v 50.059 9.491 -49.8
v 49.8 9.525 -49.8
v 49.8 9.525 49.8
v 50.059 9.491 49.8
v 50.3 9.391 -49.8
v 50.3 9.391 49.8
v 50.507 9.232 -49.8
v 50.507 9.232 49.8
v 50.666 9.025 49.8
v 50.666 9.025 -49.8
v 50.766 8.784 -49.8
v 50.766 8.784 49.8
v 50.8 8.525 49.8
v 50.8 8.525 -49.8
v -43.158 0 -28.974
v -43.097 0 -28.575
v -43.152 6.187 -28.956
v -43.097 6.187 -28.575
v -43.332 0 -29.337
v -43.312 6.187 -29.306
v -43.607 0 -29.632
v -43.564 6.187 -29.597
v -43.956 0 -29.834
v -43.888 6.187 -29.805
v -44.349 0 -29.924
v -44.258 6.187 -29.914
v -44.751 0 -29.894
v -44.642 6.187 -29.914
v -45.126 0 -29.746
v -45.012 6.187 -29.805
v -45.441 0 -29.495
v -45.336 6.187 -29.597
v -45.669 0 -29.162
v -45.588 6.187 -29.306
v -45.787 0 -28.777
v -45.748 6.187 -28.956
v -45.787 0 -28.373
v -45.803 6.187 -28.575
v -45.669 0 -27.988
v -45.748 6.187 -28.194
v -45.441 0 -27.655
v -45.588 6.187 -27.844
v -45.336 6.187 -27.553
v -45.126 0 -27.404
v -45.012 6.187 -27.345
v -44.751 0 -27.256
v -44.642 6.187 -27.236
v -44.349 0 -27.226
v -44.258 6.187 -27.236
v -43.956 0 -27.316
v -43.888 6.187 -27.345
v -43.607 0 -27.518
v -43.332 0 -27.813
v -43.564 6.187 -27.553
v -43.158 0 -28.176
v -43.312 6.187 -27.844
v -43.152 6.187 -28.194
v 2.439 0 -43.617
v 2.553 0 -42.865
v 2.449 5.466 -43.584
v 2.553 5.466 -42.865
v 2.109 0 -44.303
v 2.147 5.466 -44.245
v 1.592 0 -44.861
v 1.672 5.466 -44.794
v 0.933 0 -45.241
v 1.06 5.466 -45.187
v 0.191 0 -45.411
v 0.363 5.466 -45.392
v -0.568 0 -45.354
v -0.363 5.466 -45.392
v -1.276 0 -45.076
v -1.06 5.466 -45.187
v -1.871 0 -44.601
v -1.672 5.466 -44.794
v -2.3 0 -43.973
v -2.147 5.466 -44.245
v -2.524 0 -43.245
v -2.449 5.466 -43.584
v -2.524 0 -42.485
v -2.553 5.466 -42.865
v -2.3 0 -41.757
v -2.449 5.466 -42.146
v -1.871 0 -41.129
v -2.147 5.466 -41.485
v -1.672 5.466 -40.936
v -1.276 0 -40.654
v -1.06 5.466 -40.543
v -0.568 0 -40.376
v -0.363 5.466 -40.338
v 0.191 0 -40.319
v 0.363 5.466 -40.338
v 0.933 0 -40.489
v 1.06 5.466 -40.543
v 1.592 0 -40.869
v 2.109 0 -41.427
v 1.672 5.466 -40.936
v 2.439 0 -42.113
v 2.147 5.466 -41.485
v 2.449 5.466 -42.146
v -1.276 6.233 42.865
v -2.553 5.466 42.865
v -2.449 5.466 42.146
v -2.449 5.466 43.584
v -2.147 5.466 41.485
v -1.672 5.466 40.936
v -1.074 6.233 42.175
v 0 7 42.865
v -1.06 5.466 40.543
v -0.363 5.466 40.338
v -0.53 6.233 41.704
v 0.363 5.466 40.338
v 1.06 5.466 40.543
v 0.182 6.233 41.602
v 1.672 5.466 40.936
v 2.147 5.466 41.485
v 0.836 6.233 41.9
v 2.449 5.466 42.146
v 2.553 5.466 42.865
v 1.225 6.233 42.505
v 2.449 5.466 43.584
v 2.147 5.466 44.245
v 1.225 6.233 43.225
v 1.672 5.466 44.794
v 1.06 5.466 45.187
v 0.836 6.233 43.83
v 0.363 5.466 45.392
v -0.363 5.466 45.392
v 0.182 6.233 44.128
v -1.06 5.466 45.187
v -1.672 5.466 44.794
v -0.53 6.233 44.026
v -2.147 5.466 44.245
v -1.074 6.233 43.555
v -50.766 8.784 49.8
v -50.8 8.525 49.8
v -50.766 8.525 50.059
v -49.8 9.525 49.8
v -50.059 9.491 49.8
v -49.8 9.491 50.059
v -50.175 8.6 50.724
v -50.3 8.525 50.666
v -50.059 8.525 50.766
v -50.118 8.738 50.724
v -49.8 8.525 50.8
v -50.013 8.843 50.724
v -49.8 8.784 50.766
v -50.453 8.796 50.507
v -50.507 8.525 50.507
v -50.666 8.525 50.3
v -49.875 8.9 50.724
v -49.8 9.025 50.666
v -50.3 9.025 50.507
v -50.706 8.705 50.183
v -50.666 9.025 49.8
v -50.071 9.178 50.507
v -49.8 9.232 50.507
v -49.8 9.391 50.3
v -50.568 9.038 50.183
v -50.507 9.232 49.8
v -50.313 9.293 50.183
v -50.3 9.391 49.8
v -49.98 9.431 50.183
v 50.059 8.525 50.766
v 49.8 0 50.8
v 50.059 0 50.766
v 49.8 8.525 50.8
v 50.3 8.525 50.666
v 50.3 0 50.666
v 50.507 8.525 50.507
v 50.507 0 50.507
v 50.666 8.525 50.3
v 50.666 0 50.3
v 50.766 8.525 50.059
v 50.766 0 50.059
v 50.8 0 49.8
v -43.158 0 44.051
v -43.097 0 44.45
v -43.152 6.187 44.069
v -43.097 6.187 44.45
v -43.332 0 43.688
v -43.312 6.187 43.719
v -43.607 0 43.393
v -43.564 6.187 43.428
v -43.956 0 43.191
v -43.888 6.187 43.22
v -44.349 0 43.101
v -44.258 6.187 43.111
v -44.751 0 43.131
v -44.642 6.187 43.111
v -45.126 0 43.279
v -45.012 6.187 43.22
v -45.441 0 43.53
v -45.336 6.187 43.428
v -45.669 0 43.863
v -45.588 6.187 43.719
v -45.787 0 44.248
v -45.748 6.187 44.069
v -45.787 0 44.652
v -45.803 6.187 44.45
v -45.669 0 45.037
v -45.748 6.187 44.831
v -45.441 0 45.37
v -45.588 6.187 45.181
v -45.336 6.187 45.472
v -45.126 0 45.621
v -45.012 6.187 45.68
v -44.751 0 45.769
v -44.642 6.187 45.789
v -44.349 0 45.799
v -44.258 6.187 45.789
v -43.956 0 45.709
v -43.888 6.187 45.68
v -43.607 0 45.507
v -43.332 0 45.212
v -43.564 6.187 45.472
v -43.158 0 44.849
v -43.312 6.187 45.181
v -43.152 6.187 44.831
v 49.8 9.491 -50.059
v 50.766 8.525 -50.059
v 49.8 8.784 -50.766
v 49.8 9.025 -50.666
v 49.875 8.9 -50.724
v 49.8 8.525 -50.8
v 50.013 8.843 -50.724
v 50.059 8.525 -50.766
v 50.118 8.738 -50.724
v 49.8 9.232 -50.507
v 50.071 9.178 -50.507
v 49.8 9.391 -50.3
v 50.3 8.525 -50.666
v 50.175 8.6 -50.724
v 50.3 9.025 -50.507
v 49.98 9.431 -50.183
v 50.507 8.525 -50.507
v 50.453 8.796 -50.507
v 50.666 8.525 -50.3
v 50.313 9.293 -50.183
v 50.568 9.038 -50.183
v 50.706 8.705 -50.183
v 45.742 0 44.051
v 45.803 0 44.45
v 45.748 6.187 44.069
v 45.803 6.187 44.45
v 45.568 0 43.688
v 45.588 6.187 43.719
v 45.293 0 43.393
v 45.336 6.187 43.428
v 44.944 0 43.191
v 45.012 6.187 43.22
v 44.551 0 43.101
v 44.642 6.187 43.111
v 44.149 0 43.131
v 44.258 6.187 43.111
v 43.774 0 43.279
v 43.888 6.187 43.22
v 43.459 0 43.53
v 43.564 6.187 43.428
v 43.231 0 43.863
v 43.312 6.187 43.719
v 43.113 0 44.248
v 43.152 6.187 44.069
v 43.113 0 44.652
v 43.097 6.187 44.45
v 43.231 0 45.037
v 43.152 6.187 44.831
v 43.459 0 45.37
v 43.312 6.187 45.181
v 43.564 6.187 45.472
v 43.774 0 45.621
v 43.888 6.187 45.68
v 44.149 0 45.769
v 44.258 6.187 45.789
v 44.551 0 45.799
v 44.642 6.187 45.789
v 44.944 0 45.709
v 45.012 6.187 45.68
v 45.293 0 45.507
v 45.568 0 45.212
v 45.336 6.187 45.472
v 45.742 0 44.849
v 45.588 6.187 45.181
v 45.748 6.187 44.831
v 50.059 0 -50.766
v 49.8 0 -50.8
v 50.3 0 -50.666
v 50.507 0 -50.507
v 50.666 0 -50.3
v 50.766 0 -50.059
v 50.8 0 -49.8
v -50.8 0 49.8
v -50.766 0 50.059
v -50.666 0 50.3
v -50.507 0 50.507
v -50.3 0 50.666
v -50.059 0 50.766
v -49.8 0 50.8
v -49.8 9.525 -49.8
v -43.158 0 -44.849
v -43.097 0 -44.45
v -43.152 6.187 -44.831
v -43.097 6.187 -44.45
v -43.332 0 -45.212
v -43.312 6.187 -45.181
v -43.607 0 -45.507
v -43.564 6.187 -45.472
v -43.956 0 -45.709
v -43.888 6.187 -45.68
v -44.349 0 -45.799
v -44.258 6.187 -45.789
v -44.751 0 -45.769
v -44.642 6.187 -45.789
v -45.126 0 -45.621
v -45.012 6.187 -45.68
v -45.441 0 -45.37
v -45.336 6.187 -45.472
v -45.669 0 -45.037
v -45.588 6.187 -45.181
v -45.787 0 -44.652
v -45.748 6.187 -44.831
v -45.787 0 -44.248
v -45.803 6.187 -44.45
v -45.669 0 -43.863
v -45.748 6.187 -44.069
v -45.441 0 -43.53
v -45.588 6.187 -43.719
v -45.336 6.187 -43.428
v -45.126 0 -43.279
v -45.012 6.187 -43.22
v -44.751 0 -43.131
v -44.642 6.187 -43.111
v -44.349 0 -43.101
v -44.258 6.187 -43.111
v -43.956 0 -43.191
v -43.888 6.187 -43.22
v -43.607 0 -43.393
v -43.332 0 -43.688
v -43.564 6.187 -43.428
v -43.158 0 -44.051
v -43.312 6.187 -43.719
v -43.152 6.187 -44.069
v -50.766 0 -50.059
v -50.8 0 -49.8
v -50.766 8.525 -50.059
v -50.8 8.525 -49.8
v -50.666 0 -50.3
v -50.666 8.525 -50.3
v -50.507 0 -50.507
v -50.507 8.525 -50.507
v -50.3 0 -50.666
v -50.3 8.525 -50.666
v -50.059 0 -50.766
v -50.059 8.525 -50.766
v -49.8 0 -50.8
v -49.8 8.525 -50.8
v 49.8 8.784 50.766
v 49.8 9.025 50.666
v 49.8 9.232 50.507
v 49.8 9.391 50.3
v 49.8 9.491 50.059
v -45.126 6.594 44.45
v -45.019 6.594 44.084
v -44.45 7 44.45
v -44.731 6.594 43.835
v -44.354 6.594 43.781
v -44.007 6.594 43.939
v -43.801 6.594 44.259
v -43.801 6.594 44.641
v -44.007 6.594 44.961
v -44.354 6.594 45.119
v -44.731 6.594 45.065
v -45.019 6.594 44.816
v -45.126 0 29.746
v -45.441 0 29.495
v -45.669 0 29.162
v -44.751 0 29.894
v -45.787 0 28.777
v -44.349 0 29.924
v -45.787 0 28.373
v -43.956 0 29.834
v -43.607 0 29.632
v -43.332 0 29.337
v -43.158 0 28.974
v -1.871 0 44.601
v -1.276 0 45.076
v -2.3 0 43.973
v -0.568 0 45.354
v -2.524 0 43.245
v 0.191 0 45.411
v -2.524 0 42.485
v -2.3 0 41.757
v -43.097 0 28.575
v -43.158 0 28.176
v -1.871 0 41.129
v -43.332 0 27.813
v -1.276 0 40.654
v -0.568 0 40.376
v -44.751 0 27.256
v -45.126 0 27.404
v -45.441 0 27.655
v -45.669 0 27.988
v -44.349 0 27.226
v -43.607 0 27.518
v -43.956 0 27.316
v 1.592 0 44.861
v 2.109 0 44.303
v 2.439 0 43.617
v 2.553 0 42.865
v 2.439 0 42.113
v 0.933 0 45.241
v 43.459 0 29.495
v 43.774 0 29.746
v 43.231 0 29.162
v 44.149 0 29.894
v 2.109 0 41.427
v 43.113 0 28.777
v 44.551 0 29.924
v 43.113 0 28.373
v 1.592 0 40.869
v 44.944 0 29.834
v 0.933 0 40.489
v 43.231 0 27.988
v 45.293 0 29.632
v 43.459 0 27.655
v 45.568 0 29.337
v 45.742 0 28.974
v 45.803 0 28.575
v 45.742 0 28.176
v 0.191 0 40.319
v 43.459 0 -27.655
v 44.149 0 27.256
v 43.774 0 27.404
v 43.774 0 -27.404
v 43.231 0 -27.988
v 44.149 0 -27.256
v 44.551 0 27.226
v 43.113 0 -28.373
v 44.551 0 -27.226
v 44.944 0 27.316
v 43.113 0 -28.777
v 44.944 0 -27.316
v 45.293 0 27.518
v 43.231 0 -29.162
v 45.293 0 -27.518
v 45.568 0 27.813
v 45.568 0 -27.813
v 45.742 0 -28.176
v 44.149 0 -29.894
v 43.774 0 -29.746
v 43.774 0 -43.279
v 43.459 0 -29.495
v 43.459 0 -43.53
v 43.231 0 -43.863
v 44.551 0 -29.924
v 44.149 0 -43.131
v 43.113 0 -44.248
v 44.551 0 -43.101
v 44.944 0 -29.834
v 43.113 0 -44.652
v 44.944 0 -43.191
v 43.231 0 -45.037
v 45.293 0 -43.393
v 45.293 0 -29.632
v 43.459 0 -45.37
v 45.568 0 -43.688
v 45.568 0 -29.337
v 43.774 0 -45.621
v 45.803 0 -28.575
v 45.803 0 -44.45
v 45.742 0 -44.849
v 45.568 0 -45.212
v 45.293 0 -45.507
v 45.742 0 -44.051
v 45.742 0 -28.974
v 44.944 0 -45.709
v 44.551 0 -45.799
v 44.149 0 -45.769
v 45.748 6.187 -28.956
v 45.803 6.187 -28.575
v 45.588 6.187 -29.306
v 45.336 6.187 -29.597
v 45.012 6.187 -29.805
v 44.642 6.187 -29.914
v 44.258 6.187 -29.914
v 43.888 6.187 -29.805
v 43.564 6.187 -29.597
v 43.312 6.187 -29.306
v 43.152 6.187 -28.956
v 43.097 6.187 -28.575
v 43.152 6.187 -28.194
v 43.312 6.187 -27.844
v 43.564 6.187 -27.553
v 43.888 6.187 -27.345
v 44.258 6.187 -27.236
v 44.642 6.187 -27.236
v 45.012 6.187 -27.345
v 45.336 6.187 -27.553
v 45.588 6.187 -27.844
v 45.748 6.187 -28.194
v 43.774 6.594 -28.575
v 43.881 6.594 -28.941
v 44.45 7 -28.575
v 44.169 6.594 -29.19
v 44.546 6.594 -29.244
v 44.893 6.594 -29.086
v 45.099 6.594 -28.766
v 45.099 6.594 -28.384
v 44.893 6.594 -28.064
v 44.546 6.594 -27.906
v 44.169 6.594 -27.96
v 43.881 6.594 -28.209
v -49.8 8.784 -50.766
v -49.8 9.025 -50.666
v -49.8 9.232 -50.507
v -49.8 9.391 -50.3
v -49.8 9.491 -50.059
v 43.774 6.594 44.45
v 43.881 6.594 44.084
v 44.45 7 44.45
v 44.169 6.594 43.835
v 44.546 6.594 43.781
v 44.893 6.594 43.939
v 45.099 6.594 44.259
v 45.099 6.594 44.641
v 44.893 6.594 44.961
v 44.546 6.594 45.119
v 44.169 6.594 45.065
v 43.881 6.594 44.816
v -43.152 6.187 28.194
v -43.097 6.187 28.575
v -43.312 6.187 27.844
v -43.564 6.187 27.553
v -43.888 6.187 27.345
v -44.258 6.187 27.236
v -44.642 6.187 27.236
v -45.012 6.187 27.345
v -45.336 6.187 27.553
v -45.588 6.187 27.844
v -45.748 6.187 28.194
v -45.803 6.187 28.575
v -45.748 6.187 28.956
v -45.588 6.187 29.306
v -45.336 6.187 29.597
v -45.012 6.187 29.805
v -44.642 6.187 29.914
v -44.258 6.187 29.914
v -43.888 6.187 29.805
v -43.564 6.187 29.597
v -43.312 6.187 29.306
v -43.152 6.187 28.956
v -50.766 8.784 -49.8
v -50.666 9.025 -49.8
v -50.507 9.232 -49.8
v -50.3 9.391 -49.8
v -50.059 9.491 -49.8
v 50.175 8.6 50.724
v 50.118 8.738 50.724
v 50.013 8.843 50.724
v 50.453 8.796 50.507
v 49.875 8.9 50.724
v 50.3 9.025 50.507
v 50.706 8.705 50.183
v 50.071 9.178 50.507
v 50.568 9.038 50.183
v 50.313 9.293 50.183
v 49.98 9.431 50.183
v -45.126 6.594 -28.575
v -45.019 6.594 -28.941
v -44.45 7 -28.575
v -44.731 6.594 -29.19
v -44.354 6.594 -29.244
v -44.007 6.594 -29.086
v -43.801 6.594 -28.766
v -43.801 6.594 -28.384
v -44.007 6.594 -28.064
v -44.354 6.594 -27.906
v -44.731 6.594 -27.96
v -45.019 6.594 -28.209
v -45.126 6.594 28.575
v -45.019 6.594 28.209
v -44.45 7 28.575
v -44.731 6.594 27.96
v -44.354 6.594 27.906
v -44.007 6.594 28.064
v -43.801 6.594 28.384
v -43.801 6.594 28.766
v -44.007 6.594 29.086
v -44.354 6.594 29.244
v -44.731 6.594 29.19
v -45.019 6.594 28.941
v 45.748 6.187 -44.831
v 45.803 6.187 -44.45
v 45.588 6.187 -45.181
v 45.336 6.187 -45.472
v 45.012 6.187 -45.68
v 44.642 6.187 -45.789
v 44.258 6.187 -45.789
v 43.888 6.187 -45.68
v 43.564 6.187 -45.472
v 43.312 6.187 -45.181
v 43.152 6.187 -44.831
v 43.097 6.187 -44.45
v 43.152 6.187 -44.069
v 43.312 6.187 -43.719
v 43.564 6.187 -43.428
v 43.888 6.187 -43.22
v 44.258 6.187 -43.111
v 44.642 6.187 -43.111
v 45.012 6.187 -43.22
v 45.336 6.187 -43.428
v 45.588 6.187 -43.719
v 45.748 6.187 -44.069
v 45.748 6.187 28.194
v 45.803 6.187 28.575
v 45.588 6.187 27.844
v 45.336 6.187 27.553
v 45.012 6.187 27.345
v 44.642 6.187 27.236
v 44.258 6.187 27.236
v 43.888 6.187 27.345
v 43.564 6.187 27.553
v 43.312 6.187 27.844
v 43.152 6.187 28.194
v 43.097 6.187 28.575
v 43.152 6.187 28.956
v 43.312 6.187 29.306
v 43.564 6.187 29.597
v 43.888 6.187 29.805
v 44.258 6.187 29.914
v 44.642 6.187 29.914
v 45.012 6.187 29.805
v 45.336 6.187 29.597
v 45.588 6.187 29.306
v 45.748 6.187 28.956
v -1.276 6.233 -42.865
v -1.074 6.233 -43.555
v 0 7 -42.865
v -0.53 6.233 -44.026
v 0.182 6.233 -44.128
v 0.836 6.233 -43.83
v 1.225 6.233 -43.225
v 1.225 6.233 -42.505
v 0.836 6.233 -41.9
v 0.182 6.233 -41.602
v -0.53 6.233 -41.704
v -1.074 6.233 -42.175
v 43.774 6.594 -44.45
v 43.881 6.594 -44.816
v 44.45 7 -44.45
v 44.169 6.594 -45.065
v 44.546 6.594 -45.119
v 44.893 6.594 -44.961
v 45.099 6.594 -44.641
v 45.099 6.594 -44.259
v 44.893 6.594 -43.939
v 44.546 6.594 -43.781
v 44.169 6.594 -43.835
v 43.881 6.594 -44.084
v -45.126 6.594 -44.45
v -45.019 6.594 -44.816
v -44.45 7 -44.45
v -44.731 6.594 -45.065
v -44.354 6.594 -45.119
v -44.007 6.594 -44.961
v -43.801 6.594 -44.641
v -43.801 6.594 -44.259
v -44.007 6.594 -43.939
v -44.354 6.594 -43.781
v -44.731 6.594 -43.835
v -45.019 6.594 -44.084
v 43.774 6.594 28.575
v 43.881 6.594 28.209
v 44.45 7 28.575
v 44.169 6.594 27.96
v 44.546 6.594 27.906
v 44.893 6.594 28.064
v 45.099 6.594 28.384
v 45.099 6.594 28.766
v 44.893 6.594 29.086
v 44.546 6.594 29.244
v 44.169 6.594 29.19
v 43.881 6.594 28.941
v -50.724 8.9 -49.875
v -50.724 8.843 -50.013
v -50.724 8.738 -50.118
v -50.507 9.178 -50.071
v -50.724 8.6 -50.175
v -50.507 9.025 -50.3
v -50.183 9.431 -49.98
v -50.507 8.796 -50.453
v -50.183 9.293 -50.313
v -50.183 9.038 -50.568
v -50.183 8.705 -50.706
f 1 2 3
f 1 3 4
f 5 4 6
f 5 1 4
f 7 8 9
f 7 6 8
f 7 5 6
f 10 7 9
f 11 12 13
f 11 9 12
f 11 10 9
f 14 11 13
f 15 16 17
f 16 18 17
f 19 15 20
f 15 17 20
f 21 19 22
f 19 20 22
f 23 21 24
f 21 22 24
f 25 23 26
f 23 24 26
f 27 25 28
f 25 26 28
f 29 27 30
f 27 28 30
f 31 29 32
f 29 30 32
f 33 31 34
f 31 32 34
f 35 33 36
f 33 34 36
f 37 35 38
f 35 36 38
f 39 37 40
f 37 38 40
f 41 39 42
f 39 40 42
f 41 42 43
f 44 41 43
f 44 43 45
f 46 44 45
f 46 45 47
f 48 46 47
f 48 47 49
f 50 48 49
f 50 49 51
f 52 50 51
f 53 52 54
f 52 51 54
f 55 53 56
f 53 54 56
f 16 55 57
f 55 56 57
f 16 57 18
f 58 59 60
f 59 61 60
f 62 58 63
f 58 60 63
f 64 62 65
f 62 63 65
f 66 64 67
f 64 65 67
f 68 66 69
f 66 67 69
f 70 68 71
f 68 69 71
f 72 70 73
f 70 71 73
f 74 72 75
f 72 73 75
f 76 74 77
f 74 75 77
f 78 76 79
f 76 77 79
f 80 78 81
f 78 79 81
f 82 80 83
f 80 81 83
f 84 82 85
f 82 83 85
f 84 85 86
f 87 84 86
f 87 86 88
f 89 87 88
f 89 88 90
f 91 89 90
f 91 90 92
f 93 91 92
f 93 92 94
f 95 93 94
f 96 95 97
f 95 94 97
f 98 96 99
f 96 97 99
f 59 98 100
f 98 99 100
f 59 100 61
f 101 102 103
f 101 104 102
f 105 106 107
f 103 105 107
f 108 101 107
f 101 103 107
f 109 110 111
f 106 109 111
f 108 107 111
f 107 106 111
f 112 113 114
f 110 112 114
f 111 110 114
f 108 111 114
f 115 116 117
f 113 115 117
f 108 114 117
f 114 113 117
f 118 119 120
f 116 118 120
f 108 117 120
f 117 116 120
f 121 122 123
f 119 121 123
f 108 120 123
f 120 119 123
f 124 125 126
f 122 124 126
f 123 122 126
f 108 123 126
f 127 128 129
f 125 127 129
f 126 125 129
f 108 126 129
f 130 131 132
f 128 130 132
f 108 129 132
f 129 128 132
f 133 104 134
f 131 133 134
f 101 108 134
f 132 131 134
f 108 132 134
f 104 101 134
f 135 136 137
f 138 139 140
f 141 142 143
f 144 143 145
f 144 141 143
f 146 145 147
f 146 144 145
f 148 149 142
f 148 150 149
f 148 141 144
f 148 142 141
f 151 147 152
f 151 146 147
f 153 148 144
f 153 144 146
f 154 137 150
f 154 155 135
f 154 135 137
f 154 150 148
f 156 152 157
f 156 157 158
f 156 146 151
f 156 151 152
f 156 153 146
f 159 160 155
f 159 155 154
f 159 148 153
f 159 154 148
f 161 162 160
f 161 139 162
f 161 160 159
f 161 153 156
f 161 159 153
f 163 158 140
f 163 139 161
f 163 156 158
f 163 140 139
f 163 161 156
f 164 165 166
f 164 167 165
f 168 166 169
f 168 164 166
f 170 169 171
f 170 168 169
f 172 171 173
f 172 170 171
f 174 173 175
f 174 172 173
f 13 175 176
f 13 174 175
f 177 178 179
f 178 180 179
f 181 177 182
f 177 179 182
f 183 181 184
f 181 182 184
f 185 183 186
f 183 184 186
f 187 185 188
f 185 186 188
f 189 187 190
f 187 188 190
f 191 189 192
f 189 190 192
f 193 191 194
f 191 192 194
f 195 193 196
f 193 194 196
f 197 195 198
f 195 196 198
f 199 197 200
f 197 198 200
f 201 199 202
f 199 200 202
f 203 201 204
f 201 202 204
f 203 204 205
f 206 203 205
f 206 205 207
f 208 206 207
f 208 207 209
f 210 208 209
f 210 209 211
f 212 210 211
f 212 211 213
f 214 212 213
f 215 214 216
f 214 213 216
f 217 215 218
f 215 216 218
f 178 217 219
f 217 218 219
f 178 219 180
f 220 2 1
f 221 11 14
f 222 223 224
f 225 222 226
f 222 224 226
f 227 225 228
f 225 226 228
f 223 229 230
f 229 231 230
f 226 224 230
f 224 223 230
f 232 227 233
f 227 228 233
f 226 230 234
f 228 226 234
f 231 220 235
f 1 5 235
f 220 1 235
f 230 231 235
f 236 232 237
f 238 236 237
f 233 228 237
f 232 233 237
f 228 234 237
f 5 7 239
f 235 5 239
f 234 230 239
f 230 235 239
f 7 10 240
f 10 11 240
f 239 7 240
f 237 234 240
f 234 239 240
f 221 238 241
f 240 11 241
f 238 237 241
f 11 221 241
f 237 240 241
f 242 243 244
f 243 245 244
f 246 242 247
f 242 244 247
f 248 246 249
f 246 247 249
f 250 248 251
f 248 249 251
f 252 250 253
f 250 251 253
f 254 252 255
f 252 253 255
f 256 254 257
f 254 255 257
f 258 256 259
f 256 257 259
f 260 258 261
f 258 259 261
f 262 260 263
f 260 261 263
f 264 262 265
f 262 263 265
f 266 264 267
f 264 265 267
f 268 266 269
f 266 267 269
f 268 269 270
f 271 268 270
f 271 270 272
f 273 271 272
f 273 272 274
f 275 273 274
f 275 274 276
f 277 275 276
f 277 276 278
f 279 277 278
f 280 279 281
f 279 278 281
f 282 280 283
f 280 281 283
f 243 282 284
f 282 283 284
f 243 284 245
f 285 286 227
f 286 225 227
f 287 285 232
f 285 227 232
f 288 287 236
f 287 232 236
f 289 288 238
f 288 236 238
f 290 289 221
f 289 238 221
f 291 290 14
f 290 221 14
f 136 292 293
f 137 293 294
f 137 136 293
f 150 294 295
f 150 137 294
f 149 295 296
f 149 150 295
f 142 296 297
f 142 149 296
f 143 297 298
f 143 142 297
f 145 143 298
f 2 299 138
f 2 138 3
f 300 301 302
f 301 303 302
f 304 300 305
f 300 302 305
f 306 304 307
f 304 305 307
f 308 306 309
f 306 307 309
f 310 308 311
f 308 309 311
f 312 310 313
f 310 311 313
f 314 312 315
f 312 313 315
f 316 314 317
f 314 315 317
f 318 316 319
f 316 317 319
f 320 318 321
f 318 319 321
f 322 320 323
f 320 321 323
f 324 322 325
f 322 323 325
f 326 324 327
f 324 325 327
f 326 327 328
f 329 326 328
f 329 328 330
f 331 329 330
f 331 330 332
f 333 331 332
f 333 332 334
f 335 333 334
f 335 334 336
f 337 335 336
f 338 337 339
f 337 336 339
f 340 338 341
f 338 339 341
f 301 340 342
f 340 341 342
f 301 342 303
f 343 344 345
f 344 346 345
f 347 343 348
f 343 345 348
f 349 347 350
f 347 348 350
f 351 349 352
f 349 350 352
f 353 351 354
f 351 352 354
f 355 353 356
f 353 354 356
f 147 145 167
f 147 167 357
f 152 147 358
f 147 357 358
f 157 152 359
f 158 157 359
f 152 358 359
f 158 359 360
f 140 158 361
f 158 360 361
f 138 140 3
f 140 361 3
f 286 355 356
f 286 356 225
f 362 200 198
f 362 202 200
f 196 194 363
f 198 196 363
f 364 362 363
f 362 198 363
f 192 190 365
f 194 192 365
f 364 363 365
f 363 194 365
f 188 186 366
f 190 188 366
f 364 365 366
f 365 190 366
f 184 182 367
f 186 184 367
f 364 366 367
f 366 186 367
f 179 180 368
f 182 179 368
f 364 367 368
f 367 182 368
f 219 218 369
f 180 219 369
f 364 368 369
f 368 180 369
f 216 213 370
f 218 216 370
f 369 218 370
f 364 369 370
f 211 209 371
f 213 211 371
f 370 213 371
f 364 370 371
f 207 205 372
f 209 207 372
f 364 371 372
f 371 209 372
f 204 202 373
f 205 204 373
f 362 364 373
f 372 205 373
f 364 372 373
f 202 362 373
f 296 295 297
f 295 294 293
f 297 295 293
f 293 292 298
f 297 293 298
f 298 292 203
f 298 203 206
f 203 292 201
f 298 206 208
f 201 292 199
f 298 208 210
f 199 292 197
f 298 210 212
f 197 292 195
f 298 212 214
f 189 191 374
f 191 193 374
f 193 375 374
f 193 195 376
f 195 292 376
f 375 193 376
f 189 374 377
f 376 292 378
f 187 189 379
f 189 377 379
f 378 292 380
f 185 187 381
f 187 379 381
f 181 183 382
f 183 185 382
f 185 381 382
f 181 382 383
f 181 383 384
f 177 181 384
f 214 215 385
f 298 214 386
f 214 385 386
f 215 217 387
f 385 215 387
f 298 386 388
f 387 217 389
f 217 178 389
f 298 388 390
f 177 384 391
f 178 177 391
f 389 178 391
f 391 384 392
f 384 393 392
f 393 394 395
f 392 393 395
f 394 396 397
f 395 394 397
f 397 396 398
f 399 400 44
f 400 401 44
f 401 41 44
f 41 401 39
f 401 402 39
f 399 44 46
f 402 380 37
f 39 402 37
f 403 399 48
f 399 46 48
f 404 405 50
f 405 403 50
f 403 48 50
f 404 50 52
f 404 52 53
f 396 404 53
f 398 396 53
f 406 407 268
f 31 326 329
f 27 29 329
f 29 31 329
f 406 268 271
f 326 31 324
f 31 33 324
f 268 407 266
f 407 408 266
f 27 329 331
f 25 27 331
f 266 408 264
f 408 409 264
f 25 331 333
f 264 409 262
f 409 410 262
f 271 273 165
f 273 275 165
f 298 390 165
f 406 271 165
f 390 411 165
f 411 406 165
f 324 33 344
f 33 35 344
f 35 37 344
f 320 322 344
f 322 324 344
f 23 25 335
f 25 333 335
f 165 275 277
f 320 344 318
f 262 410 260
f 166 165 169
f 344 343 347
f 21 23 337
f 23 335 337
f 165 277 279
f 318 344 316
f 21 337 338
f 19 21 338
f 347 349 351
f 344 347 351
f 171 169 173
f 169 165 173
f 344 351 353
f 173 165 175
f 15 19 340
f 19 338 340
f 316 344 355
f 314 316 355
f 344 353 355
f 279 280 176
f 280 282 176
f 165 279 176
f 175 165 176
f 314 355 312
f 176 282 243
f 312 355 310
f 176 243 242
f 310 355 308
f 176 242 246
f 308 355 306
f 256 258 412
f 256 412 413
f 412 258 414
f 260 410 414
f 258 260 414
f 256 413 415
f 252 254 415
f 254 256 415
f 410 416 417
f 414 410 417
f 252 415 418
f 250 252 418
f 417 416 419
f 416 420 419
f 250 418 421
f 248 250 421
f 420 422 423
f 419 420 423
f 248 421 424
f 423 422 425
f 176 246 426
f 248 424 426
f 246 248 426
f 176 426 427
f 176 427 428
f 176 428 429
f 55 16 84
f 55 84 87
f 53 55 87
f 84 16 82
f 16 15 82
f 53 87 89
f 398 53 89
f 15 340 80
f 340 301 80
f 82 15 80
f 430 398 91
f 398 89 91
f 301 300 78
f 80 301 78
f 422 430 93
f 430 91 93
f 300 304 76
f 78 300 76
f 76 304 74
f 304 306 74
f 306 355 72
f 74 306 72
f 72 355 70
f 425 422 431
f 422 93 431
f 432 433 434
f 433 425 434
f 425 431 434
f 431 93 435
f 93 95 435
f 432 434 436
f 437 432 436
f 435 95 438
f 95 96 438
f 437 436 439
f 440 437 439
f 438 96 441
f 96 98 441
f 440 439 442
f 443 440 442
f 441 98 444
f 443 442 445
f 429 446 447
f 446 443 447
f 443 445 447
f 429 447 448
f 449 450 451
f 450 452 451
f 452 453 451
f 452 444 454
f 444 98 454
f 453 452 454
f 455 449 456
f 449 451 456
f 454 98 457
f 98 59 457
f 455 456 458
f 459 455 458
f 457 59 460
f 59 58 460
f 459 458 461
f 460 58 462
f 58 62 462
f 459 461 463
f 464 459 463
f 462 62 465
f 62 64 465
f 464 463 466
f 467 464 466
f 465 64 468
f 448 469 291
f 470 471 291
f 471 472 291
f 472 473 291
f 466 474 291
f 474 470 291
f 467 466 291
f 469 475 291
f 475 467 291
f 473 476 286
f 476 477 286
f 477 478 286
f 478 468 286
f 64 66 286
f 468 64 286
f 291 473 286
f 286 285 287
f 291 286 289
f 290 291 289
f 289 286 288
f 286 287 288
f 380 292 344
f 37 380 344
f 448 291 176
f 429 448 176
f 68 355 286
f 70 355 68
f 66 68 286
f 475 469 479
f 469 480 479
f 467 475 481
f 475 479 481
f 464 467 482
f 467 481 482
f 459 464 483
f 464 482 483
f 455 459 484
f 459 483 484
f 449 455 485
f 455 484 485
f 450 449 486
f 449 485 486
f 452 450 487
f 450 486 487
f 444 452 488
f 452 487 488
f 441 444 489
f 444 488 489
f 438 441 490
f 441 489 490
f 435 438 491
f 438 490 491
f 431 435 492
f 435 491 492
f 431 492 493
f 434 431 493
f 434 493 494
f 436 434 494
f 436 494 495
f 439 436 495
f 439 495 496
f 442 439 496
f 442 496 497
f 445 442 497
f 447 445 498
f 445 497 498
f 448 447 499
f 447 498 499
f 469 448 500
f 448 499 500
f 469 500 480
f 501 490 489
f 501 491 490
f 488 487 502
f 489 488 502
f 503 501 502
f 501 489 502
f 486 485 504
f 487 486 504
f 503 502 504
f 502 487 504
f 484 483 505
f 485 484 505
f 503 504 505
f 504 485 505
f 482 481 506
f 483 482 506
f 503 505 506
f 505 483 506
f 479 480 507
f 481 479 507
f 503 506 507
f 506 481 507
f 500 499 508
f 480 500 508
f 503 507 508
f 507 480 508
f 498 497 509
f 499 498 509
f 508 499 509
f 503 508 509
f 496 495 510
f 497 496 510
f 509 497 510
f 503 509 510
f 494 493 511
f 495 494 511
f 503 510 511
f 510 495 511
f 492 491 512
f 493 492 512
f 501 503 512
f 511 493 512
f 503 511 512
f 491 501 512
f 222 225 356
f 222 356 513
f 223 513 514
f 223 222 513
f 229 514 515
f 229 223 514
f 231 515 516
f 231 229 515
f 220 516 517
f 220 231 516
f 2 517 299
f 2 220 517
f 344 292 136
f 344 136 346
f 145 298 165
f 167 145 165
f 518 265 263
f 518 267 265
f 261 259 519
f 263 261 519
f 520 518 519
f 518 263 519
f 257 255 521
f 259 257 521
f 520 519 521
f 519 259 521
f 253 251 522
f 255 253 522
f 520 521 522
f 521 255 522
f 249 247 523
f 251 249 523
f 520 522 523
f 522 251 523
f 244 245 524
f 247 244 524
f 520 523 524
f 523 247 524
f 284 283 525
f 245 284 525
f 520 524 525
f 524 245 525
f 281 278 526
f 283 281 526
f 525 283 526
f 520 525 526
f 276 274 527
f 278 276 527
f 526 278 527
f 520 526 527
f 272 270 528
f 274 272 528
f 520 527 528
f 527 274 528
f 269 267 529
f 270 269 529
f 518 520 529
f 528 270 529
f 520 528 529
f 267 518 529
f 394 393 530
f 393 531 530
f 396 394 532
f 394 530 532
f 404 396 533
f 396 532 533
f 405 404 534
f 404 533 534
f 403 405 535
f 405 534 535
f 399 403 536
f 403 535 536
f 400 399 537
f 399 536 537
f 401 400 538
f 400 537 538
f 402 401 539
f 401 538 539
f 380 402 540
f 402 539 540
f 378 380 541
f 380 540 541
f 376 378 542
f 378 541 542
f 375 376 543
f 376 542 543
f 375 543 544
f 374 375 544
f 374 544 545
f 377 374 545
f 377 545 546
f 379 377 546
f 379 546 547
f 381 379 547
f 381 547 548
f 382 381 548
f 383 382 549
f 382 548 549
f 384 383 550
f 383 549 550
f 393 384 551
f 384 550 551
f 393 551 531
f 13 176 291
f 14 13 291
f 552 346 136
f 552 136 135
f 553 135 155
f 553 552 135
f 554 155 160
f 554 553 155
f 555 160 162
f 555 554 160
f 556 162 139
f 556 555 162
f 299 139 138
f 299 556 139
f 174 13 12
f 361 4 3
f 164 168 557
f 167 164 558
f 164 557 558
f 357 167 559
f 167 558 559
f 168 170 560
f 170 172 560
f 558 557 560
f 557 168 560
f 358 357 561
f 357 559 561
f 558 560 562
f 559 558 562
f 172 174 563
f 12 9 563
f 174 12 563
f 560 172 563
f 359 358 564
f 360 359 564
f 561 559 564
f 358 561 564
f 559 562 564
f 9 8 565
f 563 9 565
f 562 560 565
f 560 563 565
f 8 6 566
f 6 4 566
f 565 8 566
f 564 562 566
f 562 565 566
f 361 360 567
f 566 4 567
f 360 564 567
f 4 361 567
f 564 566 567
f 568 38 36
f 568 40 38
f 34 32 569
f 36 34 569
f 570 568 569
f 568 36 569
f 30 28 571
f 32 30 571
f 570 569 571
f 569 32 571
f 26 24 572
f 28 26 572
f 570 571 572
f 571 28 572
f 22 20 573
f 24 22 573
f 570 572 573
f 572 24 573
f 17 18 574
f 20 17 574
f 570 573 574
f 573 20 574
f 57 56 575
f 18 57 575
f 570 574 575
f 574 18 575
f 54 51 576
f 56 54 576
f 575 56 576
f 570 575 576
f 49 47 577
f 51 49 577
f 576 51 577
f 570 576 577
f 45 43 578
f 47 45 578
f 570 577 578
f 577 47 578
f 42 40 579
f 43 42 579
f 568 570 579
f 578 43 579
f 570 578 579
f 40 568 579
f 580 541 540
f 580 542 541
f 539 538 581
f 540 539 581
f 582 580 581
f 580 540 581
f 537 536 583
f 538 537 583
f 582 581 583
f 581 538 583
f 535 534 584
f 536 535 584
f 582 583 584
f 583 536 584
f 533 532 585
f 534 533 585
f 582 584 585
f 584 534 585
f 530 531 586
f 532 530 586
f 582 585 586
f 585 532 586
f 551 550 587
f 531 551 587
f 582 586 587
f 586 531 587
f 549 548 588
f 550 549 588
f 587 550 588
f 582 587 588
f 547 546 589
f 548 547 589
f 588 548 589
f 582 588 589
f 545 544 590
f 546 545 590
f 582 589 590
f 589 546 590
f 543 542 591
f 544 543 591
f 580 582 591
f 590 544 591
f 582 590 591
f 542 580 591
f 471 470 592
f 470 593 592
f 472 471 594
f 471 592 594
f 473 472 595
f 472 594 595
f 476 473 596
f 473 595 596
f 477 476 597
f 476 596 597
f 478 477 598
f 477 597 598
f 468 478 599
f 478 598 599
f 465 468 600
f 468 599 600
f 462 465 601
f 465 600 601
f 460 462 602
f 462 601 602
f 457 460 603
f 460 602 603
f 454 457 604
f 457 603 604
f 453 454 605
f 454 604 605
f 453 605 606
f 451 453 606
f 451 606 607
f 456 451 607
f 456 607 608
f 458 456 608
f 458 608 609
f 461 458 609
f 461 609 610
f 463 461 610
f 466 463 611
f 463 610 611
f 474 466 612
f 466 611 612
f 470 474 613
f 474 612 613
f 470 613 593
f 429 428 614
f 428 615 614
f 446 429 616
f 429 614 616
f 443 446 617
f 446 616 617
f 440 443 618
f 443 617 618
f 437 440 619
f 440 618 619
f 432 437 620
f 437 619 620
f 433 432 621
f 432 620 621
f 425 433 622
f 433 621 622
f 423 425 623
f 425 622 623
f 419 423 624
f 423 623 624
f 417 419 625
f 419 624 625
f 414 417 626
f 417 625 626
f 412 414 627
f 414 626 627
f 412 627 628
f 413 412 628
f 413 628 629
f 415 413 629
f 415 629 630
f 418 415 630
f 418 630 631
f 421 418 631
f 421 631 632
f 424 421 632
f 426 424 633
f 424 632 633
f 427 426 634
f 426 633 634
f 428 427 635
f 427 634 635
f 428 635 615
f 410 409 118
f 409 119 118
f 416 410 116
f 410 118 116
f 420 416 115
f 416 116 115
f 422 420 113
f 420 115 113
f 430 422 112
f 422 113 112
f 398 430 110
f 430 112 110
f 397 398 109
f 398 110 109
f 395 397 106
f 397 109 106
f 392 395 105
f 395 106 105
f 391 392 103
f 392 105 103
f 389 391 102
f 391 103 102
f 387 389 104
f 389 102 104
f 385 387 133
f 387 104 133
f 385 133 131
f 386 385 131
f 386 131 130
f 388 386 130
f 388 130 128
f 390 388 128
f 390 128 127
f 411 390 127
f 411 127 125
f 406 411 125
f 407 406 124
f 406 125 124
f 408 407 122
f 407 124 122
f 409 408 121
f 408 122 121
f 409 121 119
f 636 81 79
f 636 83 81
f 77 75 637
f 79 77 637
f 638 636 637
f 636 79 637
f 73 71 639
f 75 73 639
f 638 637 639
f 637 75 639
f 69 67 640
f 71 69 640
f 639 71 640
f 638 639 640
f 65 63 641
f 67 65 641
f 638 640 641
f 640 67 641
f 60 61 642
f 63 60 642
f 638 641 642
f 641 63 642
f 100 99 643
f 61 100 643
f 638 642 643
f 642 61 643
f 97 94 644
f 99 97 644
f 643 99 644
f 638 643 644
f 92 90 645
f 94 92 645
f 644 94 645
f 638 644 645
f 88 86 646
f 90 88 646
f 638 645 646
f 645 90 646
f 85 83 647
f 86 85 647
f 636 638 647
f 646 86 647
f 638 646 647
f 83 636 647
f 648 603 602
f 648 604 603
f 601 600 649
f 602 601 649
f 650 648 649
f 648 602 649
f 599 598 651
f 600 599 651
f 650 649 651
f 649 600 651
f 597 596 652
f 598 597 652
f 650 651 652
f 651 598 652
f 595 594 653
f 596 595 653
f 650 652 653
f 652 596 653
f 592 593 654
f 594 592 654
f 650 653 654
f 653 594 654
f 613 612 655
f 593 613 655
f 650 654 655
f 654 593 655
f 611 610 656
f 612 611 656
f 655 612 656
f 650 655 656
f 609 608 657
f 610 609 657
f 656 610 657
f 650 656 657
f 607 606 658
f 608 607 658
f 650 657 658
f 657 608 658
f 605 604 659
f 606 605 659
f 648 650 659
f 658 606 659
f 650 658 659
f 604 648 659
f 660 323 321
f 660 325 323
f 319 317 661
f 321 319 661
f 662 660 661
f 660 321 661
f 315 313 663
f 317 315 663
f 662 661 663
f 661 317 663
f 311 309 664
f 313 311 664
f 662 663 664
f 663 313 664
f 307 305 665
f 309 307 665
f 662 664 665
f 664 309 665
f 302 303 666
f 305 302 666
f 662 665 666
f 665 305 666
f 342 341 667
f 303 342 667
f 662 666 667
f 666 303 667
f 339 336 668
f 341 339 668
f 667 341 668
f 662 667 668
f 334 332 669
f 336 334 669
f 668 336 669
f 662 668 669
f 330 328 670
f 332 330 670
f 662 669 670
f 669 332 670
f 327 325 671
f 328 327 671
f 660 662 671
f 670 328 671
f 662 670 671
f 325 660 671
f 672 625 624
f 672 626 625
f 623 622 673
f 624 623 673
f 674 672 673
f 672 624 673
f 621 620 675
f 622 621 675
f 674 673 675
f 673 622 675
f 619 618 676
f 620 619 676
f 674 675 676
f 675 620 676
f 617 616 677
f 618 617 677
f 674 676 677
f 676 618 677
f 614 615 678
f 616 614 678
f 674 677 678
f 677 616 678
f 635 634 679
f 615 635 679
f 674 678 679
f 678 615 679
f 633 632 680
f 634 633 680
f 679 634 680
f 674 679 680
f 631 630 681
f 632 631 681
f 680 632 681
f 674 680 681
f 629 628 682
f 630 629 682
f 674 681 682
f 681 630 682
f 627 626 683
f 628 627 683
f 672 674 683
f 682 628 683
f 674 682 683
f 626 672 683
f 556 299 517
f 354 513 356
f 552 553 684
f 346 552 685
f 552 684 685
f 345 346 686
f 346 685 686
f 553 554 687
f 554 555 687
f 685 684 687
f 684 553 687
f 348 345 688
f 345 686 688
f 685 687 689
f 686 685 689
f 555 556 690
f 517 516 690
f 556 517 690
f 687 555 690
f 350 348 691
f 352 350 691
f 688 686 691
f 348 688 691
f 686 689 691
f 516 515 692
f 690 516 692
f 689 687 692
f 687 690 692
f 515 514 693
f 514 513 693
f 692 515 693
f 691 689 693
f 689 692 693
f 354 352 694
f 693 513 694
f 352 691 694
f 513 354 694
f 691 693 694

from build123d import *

# Parameters (mm, degrees)
SKETCH1_W                       = 101.6
SKETCH1_H                       = 101.6
BOSS_EXTRUDE1_DEPTH             = 9.525
TAP_DRILL_FOR_6_32_TAP1_D       = 2.7051
TAP_DRILL_FOR_6_32_TAP1_DEPTH   = 6.18730597
TAP_DRILL_FOR_6_32_TAP1_TIP     = 0.81269403
TAP_DRILL_FOR_1_4_20_TAP1_D     = 5.1054
TAP_DRILL_FOR_1_4_20_TAP1_DEPTH = 5.466183098
TAP_DRILL_FOR_1_4_20_TAP1_TIP   = 1.533816902
FILLET1_R                       = 1


with BuildPart() as part:
    # Sketch1 → Boss-Extrude1 (new body)
    with BuildSketch(Plane(origin=(0, 0, 0), x_dir=(1, 0, 0), z_dir=(0, 1, 0))):
        Rectangle(SKETCH1_W, SKETCH1_H)
    extrude(amount=BOSS_EXTRUDE1_DEPTH)

    # Tap Drill for #6-32 Tap1
    with Locations(Plane(origin=(0, 0, 0), x_dir=(-1, 0, 0), z_dir=(0, -1, 0))):
        with Locations((-44.45, -44.45), (-44.45, 44.45), (44.45, 44.45), (44.45, -44.45), (-44.45, -28.575), (-44.45, 28.575), (44.45, 28.575), (44.45, -28.575)):
            Hole(TAP_DRILL_FOR_6_32_TAP1_D / 2, depth=TAP_DRILL_FOR_6_32_TAP1_DEPTH)
            with Locations((0, 0, -(TAP_DRILL_FOR_6_32_TAP1_DEPTH + TAP_DRILL_FOR_6_32_TAP1_TIP / 2))):  # 118° drill point
                Cone(0, TAP_DRILL_FOR_6_32_TAP1_D / 2, TAP_DRILL_FOR_6_32_TAP1_TIP, mode=Mode.SUBTRACT)

    # Tap Drill for 1/4-20 Tap1
    with Locations(Plane(origin=(0, 0, 0), x_dir=(-1, 0, 0), z_dir=(0, -1, 0))):
        with Locations((0, -42.865), (0, 42.865)):
            Hole(TAP_DRILL_FOR_1_4_20_TAP1_D / 2, depth=TAP_DRILL_FOR_1_4_20_TAP1_DEPTH)
            with Locations((0, 0, -(TAP_DRILL_FOR_1_4_20_TAP1_DEPTH + TAP_DRILL_FOR_1_4_20_TAP1_TIP / 2))):  # 118° drill point
                Cone(0, TAP_DRILL_FOR_1_4_20_TAP1_D / 2, TAP_DRILL_FOR_1_4_20_TAP1_TIP, mode=Mode.SUBTRACT)

    # Fillet1
    fillet1_edges = [part.edges().sort_by_distance(p)[0] for p in [
        (50.8, 9.525, 0),
        (0, 9.525, -50.8),
        (-50.8, 9.525, 0),
        (-50.8, 4.7625, -50.8),
        (50.8, 4.7625, -50.8),
        (50.8, 4.7625, 50.8),
        (-50.8, 4.7625, 50.8),
        (0, 9.525, 50.8),
    ]]
    fillet(fillet1_edges, radius=FILLET1_R)


solid = part.part
